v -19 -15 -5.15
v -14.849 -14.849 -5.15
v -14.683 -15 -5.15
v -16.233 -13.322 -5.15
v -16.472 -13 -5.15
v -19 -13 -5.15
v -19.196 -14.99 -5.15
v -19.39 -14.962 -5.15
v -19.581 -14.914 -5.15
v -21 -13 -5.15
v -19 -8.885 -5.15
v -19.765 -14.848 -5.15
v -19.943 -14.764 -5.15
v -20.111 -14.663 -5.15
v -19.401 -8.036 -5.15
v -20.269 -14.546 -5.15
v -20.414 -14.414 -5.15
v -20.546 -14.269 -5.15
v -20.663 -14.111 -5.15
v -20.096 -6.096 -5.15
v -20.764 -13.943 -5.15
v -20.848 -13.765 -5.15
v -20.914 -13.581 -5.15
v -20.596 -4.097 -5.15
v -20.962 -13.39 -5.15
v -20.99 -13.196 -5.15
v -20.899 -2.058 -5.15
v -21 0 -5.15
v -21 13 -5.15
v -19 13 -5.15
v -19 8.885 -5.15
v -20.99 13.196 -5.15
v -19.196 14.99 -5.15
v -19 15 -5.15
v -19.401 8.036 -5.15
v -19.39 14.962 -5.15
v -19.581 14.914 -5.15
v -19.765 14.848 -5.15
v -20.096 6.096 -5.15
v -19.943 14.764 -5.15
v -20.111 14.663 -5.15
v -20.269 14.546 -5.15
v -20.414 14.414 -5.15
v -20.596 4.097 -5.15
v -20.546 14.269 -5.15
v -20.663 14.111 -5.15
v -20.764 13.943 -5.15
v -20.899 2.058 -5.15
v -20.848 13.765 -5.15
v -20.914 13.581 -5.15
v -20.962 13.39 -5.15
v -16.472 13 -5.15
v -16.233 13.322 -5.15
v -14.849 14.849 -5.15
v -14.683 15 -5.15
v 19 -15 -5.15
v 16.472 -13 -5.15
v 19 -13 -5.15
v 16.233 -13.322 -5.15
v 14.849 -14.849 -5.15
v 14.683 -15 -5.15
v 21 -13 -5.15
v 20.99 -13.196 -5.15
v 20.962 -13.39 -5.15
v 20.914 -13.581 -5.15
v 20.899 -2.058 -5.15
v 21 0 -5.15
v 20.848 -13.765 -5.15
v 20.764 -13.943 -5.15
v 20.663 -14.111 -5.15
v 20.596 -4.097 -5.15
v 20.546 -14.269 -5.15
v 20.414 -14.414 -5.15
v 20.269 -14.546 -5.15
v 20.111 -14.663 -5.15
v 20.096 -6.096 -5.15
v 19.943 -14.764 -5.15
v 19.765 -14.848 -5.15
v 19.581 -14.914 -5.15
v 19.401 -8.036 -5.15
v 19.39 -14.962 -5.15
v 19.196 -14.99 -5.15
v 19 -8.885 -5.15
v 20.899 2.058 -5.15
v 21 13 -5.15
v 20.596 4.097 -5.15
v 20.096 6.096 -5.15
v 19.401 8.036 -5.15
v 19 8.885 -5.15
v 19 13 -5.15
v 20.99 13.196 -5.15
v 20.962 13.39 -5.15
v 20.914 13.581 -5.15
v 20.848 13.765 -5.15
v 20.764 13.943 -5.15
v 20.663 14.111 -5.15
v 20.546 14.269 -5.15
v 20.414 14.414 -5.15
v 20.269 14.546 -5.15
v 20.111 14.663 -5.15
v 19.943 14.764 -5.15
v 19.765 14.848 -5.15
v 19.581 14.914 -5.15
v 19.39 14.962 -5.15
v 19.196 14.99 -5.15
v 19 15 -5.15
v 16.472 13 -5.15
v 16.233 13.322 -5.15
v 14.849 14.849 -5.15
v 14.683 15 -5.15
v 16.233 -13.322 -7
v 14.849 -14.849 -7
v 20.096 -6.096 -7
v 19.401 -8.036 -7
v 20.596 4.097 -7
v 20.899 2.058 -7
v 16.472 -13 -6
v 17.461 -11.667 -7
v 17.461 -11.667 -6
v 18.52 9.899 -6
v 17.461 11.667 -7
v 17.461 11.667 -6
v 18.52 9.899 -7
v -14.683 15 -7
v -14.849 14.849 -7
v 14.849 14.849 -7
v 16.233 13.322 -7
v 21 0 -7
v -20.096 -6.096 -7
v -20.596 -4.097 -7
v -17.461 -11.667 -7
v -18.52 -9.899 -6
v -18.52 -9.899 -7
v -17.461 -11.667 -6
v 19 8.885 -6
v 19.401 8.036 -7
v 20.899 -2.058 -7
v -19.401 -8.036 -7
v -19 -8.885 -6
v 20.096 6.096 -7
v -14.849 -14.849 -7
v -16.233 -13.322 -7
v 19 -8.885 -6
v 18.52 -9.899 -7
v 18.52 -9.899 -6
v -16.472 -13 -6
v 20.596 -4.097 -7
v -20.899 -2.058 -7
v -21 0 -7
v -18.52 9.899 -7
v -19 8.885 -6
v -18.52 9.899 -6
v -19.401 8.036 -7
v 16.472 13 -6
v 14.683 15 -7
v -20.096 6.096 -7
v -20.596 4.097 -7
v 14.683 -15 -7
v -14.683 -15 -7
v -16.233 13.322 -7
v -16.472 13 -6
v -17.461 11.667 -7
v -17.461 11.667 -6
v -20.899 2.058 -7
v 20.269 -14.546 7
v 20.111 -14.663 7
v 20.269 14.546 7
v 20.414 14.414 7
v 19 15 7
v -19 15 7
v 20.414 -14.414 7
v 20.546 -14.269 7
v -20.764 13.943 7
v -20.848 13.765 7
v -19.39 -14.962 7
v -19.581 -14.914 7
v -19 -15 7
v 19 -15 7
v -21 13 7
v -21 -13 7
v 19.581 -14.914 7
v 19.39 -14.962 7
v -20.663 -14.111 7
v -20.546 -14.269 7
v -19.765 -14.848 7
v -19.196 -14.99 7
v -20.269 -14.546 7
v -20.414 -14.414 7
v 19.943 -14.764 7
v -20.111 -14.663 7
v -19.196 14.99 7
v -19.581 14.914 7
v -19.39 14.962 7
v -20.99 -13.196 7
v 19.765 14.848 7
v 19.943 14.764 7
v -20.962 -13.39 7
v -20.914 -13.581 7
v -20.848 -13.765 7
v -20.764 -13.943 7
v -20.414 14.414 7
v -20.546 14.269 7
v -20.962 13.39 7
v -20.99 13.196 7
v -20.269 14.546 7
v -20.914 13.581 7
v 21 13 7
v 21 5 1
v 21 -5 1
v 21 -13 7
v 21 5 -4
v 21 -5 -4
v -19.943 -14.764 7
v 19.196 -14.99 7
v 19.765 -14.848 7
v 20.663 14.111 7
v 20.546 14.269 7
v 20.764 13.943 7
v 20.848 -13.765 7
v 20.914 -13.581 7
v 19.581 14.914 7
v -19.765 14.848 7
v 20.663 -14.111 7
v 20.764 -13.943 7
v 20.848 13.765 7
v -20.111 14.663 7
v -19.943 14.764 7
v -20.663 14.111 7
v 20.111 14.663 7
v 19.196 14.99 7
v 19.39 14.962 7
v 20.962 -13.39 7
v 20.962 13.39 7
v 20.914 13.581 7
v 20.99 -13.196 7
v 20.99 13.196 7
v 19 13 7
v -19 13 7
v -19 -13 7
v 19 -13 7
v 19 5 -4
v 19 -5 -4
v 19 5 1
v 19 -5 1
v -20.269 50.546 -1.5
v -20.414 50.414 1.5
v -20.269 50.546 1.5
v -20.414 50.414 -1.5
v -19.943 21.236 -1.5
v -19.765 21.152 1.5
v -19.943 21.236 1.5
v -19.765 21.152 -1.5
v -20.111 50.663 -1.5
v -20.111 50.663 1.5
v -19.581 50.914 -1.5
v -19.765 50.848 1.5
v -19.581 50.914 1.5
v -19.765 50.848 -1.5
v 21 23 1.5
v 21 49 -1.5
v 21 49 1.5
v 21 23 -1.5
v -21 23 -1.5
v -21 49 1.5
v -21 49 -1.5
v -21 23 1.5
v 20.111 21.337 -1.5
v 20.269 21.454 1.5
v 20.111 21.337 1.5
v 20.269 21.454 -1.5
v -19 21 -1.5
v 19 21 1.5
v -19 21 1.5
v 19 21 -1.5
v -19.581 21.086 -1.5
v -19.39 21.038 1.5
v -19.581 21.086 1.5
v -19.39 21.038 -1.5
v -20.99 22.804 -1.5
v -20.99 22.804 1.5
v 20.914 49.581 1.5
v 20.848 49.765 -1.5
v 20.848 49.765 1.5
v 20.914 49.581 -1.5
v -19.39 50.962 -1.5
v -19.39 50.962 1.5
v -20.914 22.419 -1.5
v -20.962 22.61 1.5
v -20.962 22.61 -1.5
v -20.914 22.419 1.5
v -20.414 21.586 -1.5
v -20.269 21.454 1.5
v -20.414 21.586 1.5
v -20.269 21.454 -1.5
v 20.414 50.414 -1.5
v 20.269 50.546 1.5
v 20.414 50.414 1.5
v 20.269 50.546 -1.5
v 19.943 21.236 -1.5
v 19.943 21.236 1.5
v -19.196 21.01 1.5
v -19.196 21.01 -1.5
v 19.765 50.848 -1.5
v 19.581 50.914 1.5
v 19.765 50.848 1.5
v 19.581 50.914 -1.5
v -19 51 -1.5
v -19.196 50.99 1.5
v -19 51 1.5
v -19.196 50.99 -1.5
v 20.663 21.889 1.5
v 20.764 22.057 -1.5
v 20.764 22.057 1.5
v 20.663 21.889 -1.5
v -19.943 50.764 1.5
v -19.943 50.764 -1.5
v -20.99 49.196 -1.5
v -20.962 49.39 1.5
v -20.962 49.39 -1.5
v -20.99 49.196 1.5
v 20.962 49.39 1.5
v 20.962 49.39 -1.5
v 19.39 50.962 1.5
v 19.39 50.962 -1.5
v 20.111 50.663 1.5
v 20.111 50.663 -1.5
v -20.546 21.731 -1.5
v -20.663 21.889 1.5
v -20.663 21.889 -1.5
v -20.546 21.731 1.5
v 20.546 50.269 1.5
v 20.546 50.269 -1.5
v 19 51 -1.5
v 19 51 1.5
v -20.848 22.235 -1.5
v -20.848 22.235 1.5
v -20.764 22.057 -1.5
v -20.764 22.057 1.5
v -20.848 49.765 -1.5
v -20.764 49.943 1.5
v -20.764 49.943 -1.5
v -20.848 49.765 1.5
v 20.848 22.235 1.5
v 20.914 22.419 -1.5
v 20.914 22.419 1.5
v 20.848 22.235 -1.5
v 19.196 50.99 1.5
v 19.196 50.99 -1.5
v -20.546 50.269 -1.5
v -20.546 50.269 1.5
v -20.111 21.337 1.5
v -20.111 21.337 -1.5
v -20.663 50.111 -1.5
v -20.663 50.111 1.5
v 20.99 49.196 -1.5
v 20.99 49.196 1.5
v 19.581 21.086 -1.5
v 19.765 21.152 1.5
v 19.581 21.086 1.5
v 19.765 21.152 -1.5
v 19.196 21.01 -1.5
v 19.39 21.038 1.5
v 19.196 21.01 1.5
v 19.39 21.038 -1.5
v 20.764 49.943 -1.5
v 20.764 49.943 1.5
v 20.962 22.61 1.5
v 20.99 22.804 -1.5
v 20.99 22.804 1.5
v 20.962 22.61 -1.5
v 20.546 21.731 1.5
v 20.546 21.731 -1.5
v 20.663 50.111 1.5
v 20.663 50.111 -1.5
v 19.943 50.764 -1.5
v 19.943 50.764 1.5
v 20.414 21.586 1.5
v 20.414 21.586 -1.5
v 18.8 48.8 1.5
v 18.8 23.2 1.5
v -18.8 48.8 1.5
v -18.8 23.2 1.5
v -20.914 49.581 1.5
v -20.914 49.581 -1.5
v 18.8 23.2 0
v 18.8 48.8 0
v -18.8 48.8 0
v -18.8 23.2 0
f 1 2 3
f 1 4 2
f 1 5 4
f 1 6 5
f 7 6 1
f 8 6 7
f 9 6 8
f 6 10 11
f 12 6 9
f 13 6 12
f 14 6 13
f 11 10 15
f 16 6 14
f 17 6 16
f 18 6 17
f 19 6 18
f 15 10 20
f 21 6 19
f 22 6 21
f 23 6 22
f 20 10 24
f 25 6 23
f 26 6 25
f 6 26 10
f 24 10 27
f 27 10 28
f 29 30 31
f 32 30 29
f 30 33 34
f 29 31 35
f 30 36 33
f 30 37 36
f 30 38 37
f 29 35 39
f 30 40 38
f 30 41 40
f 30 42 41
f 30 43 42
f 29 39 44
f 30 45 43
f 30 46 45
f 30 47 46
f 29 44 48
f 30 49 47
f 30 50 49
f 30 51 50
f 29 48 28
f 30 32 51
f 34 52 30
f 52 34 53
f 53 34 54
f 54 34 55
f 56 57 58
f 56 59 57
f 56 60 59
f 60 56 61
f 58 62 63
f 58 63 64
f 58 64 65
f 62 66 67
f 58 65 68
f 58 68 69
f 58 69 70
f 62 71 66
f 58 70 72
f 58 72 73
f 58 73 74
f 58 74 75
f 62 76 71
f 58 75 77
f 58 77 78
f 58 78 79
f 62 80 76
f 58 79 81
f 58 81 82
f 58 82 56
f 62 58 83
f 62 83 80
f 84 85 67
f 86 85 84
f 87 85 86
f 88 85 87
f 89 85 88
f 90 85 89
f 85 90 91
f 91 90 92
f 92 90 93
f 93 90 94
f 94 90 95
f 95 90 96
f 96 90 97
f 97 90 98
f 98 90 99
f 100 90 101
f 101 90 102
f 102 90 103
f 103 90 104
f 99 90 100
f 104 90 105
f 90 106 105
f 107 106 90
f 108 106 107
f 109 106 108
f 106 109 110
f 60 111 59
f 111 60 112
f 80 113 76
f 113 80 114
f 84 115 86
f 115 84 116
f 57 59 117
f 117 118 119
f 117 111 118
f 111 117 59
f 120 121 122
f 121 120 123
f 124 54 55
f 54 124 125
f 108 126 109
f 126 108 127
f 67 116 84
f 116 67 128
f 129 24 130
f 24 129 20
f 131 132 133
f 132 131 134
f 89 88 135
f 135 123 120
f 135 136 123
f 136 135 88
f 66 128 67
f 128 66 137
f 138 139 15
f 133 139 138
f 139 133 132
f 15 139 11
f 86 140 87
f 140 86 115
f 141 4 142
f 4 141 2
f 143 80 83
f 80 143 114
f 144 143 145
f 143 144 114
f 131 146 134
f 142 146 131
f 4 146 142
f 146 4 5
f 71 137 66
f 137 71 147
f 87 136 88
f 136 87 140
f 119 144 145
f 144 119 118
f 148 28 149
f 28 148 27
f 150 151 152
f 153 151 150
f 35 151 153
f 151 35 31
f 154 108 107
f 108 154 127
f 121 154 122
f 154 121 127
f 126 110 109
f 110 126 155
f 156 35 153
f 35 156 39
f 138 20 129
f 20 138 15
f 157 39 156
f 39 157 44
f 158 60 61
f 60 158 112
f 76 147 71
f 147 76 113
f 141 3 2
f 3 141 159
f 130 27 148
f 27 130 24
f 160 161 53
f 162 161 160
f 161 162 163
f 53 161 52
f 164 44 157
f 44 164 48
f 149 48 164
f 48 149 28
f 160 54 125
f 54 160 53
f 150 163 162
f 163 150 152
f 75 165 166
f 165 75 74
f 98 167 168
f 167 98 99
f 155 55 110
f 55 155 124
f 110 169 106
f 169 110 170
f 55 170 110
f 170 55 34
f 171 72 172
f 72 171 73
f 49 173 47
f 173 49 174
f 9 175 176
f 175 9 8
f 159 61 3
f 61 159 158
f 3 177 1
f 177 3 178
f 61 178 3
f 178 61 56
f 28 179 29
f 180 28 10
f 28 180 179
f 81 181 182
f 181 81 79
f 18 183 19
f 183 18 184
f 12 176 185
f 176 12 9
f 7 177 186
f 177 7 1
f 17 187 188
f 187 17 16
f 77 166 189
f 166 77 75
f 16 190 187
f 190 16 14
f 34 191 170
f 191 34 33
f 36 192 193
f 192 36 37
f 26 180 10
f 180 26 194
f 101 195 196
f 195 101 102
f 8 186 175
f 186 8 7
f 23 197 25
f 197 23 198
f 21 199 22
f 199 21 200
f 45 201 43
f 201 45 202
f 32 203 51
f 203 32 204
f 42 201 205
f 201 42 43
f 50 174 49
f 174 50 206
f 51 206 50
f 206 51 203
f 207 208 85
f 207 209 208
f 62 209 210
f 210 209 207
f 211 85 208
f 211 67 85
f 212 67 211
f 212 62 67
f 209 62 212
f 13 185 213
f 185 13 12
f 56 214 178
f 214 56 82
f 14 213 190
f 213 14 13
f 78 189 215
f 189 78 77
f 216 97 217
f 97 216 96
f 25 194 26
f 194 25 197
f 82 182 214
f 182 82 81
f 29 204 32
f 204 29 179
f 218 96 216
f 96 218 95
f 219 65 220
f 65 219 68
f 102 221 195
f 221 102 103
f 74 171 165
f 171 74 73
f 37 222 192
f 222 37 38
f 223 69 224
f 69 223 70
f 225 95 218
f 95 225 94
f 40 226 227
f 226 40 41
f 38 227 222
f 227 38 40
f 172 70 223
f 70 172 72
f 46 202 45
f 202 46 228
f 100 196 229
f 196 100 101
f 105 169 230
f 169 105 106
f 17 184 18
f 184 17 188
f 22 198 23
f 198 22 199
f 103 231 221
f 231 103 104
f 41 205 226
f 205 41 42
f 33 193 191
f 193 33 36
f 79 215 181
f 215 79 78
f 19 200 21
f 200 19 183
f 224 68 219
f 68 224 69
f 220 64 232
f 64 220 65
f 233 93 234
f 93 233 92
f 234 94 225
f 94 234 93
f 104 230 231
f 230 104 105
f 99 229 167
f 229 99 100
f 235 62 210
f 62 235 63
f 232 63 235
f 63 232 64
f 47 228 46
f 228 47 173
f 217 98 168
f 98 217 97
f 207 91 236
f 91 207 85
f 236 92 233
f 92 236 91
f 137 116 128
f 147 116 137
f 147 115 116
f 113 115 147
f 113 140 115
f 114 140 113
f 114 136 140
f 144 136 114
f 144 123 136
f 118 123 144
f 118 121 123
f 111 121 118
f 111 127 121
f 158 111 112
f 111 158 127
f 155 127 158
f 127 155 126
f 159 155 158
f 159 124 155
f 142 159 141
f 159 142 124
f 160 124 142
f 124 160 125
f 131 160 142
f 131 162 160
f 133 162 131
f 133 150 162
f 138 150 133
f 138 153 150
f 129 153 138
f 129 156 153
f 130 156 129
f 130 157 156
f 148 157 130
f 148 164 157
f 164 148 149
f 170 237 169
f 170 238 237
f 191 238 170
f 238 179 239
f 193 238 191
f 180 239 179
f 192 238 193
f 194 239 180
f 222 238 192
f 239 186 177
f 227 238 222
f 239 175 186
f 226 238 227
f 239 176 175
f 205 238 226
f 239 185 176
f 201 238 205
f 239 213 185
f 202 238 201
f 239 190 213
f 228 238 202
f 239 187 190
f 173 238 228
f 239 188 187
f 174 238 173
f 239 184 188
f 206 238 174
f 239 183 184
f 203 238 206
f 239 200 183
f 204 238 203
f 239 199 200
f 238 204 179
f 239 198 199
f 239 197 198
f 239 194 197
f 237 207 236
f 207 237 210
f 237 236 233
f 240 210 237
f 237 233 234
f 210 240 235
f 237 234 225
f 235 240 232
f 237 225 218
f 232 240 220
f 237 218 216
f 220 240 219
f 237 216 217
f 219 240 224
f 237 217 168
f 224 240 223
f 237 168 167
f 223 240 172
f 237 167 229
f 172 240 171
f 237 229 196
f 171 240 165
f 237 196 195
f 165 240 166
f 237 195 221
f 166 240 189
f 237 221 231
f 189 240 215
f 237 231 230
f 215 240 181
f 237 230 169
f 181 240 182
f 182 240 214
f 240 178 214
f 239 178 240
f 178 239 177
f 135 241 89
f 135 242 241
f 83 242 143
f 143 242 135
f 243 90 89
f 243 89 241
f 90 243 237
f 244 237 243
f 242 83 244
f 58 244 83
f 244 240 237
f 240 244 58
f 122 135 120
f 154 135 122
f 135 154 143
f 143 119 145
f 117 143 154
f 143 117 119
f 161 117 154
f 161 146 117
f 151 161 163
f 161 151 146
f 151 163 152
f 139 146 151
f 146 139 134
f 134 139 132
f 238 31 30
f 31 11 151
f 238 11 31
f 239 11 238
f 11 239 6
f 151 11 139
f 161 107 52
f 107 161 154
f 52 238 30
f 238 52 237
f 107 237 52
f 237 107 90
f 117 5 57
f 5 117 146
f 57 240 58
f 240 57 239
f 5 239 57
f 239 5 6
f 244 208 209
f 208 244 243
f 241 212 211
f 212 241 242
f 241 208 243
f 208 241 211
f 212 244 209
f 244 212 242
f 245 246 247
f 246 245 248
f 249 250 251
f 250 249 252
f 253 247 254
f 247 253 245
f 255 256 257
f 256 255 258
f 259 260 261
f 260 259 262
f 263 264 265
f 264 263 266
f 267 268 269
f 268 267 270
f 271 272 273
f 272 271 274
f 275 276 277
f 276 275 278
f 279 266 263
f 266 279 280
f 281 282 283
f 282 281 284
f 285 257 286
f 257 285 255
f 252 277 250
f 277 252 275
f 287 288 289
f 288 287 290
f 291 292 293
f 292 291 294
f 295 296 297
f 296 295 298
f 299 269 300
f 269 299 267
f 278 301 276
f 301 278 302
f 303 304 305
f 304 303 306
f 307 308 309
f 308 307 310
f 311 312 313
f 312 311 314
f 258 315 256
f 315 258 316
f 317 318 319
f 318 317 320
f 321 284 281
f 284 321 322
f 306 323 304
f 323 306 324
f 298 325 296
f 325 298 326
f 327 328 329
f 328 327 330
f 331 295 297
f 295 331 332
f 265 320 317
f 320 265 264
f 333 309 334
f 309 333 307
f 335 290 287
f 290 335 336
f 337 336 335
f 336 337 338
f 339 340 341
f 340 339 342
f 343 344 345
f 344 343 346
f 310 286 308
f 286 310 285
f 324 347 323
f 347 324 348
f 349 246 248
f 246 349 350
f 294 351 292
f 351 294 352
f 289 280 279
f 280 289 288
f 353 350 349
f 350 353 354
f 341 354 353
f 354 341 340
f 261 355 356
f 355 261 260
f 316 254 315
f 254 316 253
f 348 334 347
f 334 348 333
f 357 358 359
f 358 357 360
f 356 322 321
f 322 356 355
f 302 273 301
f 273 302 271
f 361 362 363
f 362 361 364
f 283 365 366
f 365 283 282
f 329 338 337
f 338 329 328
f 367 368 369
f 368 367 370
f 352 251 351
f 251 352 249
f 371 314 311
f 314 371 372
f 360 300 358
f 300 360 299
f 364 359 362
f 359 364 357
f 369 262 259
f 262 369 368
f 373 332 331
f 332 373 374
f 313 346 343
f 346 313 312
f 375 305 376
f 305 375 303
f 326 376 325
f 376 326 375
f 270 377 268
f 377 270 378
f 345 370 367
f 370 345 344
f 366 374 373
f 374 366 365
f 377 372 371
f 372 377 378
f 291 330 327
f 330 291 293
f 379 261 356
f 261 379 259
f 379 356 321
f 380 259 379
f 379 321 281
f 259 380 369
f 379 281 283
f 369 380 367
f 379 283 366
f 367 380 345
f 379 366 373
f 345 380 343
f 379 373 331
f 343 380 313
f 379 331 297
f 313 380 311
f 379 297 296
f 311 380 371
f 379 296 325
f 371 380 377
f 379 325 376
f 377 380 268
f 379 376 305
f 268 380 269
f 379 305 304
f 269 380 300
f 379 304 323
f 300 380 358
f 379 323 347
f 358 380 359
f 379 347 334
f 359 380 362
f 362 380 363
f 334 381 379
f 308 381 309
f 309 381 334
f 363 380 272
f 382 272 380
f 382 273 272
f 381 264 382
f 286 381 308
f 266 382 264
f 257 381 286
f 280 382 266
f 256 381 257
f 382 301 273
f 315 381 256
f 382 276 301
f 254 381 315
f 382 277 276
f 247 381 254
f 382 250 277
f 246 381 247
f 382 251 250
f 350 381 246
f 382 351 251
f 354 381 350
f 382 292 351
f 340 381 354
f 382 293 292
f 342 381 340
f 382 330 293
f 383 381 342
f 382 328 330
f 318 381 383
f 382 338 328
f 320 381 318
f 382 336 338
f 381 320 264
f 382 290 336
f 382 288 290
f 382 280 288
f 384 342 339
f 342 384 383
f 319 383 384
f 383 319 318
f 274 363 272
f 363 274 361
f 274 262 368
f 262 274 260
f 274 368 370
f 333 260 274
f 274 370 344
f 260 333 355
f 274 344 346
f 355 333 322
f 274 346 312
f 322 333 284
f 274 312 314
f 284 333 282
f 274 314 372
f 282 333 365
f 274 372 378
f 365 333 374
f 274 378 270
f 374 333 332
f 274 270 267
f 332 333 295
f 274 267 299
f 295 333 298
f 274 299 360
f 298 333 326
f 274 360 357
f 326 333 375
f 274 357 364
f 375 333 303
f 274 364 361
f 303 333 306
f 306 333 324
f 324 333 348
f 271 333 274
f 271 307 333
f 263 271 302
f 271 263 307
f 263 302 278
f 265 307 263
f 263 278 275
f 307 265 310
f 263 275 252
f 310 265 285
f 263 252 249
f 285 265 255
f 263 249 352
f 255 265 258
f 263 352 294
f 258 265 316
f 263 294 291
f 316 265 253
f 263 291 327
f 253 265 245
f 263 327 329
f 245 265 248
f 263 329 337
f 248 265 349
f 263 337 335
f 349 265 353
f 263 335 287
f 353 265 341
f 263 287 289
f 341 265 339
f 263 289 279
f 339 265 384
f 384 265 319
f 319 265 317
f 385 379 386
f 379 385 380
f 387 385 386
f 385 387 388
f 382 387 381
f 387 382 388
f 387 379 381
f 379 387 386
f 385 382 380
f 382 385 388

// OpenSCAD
// ============================================================================
// salesUp Capture — prototype-behuizing (parametrisch, OpenSCAD)
// ============================================================================
// Voor het XIAO ESP32S3 Sense-prototype (zie ../README.md). Twee delen:
// een bakje + klikdeksel, met:
//  - microfoon-opening aan de bovenkant
//  - opening voor de USB-C / drukknop aan de zijkant
//  - een ronde uitsparing aan de achterkant voor een magneetring (Ø56 mm,
//    MagSafe-stijl) ZODAT het toestel op de achterkant van een telefoon klikt;
//    of laat de ring weg en gebruik een 3M-plakker op het platte vlak.
//
// Dit is een START-ontwerp om snel te kunnen printen en testen — meet je
// concrete onderdelen op en pas de variabelen hieronder aan vóór het printen.
// Render: openscad salesup_capture_case.scad  (of open in de OpenSCAD-GUI).
// ============================================================================

/* [Binnenmaten — meet je samengestelde elektronica op] */
inner_l = 38;     // lengte (mm): board + LiPo naast elkaar
inner_w = 26;     // breedte (mm)
inner_h = 12;     // hoogte (mm): board + batterij gestapeld
wall    = 2.0;    // wanddikte
lid_h   = 3.0;    // dekselhoogte

/* [Openingen] */
mic_d      = 3.5;             // microfoongaatje (boven)
usb_w      = 10; usb_h = 5;   // USB-C / knop-opening (zijkant)

/* [Magneetring achterkant] */
use_magnet_ring = true;
ring_outer = 56;   // MagSafe-ring buitendiameter
ring_inner = 42;   // binnendiameter
ring_depth = 1.8;  // diepte van de uitsparing (ring + dunne plak)

$fn = 64;
ol = inner_l + 2*wall;   // buitenmaten
ow = inner_w + 2*wall;
oh = inner_h + wall;     // bodem + zijwanden (deksel apart)

module shell() {
  difference() {
    // massieve buitenvorm met afgeronde hoeken
    minkowski() { cube([ol-4, ow-4, oh-2], center=true); cylinder(r=2, h=2, center=true); }
    // holte
    translate([0,0,wall/2]) cube([inner_l, inner_w, inner_h+2], center=true);
    // microfoon boven
    translate([0,0,oh/2]) cylinder(d=mic_d, h=wall*3, center=true);
    // USB/knop zijkant
    translate([ol/2, 0, -oh/4 + wall]) cube([wall*4, usb_w, usb_h], center=true);
    // magneetring-uitsparing in de bodem
    if (use_magnet_ring)
      translate([0,0,-oh/2 + ring_depth/2])
        difference() {
          cylinder(d=ring_outer, h=ring_depth+0.1, center=true);
          cylinder(d=ring_inner, h=ring_depth+0.2, center=true);
        }
  }
}

module lid() {
  translate([0, ow + 6, 0]) {
    difference() {
      minkowski() { cube([ol-4, ow-4, lid_h-2], center=true); cylinder(r=2, h=2, center=true); }
      // klikrand (lip die in de holte valt)
      translate([0,0,lid_h/2]) cube([inner_l-0.4, inner_w-0.4, lid_h], center=true);
    }
    // ventilatie/microfoon-doorvoer ook in deksel-zijde optioneel
  }
}

shell();
lid();
